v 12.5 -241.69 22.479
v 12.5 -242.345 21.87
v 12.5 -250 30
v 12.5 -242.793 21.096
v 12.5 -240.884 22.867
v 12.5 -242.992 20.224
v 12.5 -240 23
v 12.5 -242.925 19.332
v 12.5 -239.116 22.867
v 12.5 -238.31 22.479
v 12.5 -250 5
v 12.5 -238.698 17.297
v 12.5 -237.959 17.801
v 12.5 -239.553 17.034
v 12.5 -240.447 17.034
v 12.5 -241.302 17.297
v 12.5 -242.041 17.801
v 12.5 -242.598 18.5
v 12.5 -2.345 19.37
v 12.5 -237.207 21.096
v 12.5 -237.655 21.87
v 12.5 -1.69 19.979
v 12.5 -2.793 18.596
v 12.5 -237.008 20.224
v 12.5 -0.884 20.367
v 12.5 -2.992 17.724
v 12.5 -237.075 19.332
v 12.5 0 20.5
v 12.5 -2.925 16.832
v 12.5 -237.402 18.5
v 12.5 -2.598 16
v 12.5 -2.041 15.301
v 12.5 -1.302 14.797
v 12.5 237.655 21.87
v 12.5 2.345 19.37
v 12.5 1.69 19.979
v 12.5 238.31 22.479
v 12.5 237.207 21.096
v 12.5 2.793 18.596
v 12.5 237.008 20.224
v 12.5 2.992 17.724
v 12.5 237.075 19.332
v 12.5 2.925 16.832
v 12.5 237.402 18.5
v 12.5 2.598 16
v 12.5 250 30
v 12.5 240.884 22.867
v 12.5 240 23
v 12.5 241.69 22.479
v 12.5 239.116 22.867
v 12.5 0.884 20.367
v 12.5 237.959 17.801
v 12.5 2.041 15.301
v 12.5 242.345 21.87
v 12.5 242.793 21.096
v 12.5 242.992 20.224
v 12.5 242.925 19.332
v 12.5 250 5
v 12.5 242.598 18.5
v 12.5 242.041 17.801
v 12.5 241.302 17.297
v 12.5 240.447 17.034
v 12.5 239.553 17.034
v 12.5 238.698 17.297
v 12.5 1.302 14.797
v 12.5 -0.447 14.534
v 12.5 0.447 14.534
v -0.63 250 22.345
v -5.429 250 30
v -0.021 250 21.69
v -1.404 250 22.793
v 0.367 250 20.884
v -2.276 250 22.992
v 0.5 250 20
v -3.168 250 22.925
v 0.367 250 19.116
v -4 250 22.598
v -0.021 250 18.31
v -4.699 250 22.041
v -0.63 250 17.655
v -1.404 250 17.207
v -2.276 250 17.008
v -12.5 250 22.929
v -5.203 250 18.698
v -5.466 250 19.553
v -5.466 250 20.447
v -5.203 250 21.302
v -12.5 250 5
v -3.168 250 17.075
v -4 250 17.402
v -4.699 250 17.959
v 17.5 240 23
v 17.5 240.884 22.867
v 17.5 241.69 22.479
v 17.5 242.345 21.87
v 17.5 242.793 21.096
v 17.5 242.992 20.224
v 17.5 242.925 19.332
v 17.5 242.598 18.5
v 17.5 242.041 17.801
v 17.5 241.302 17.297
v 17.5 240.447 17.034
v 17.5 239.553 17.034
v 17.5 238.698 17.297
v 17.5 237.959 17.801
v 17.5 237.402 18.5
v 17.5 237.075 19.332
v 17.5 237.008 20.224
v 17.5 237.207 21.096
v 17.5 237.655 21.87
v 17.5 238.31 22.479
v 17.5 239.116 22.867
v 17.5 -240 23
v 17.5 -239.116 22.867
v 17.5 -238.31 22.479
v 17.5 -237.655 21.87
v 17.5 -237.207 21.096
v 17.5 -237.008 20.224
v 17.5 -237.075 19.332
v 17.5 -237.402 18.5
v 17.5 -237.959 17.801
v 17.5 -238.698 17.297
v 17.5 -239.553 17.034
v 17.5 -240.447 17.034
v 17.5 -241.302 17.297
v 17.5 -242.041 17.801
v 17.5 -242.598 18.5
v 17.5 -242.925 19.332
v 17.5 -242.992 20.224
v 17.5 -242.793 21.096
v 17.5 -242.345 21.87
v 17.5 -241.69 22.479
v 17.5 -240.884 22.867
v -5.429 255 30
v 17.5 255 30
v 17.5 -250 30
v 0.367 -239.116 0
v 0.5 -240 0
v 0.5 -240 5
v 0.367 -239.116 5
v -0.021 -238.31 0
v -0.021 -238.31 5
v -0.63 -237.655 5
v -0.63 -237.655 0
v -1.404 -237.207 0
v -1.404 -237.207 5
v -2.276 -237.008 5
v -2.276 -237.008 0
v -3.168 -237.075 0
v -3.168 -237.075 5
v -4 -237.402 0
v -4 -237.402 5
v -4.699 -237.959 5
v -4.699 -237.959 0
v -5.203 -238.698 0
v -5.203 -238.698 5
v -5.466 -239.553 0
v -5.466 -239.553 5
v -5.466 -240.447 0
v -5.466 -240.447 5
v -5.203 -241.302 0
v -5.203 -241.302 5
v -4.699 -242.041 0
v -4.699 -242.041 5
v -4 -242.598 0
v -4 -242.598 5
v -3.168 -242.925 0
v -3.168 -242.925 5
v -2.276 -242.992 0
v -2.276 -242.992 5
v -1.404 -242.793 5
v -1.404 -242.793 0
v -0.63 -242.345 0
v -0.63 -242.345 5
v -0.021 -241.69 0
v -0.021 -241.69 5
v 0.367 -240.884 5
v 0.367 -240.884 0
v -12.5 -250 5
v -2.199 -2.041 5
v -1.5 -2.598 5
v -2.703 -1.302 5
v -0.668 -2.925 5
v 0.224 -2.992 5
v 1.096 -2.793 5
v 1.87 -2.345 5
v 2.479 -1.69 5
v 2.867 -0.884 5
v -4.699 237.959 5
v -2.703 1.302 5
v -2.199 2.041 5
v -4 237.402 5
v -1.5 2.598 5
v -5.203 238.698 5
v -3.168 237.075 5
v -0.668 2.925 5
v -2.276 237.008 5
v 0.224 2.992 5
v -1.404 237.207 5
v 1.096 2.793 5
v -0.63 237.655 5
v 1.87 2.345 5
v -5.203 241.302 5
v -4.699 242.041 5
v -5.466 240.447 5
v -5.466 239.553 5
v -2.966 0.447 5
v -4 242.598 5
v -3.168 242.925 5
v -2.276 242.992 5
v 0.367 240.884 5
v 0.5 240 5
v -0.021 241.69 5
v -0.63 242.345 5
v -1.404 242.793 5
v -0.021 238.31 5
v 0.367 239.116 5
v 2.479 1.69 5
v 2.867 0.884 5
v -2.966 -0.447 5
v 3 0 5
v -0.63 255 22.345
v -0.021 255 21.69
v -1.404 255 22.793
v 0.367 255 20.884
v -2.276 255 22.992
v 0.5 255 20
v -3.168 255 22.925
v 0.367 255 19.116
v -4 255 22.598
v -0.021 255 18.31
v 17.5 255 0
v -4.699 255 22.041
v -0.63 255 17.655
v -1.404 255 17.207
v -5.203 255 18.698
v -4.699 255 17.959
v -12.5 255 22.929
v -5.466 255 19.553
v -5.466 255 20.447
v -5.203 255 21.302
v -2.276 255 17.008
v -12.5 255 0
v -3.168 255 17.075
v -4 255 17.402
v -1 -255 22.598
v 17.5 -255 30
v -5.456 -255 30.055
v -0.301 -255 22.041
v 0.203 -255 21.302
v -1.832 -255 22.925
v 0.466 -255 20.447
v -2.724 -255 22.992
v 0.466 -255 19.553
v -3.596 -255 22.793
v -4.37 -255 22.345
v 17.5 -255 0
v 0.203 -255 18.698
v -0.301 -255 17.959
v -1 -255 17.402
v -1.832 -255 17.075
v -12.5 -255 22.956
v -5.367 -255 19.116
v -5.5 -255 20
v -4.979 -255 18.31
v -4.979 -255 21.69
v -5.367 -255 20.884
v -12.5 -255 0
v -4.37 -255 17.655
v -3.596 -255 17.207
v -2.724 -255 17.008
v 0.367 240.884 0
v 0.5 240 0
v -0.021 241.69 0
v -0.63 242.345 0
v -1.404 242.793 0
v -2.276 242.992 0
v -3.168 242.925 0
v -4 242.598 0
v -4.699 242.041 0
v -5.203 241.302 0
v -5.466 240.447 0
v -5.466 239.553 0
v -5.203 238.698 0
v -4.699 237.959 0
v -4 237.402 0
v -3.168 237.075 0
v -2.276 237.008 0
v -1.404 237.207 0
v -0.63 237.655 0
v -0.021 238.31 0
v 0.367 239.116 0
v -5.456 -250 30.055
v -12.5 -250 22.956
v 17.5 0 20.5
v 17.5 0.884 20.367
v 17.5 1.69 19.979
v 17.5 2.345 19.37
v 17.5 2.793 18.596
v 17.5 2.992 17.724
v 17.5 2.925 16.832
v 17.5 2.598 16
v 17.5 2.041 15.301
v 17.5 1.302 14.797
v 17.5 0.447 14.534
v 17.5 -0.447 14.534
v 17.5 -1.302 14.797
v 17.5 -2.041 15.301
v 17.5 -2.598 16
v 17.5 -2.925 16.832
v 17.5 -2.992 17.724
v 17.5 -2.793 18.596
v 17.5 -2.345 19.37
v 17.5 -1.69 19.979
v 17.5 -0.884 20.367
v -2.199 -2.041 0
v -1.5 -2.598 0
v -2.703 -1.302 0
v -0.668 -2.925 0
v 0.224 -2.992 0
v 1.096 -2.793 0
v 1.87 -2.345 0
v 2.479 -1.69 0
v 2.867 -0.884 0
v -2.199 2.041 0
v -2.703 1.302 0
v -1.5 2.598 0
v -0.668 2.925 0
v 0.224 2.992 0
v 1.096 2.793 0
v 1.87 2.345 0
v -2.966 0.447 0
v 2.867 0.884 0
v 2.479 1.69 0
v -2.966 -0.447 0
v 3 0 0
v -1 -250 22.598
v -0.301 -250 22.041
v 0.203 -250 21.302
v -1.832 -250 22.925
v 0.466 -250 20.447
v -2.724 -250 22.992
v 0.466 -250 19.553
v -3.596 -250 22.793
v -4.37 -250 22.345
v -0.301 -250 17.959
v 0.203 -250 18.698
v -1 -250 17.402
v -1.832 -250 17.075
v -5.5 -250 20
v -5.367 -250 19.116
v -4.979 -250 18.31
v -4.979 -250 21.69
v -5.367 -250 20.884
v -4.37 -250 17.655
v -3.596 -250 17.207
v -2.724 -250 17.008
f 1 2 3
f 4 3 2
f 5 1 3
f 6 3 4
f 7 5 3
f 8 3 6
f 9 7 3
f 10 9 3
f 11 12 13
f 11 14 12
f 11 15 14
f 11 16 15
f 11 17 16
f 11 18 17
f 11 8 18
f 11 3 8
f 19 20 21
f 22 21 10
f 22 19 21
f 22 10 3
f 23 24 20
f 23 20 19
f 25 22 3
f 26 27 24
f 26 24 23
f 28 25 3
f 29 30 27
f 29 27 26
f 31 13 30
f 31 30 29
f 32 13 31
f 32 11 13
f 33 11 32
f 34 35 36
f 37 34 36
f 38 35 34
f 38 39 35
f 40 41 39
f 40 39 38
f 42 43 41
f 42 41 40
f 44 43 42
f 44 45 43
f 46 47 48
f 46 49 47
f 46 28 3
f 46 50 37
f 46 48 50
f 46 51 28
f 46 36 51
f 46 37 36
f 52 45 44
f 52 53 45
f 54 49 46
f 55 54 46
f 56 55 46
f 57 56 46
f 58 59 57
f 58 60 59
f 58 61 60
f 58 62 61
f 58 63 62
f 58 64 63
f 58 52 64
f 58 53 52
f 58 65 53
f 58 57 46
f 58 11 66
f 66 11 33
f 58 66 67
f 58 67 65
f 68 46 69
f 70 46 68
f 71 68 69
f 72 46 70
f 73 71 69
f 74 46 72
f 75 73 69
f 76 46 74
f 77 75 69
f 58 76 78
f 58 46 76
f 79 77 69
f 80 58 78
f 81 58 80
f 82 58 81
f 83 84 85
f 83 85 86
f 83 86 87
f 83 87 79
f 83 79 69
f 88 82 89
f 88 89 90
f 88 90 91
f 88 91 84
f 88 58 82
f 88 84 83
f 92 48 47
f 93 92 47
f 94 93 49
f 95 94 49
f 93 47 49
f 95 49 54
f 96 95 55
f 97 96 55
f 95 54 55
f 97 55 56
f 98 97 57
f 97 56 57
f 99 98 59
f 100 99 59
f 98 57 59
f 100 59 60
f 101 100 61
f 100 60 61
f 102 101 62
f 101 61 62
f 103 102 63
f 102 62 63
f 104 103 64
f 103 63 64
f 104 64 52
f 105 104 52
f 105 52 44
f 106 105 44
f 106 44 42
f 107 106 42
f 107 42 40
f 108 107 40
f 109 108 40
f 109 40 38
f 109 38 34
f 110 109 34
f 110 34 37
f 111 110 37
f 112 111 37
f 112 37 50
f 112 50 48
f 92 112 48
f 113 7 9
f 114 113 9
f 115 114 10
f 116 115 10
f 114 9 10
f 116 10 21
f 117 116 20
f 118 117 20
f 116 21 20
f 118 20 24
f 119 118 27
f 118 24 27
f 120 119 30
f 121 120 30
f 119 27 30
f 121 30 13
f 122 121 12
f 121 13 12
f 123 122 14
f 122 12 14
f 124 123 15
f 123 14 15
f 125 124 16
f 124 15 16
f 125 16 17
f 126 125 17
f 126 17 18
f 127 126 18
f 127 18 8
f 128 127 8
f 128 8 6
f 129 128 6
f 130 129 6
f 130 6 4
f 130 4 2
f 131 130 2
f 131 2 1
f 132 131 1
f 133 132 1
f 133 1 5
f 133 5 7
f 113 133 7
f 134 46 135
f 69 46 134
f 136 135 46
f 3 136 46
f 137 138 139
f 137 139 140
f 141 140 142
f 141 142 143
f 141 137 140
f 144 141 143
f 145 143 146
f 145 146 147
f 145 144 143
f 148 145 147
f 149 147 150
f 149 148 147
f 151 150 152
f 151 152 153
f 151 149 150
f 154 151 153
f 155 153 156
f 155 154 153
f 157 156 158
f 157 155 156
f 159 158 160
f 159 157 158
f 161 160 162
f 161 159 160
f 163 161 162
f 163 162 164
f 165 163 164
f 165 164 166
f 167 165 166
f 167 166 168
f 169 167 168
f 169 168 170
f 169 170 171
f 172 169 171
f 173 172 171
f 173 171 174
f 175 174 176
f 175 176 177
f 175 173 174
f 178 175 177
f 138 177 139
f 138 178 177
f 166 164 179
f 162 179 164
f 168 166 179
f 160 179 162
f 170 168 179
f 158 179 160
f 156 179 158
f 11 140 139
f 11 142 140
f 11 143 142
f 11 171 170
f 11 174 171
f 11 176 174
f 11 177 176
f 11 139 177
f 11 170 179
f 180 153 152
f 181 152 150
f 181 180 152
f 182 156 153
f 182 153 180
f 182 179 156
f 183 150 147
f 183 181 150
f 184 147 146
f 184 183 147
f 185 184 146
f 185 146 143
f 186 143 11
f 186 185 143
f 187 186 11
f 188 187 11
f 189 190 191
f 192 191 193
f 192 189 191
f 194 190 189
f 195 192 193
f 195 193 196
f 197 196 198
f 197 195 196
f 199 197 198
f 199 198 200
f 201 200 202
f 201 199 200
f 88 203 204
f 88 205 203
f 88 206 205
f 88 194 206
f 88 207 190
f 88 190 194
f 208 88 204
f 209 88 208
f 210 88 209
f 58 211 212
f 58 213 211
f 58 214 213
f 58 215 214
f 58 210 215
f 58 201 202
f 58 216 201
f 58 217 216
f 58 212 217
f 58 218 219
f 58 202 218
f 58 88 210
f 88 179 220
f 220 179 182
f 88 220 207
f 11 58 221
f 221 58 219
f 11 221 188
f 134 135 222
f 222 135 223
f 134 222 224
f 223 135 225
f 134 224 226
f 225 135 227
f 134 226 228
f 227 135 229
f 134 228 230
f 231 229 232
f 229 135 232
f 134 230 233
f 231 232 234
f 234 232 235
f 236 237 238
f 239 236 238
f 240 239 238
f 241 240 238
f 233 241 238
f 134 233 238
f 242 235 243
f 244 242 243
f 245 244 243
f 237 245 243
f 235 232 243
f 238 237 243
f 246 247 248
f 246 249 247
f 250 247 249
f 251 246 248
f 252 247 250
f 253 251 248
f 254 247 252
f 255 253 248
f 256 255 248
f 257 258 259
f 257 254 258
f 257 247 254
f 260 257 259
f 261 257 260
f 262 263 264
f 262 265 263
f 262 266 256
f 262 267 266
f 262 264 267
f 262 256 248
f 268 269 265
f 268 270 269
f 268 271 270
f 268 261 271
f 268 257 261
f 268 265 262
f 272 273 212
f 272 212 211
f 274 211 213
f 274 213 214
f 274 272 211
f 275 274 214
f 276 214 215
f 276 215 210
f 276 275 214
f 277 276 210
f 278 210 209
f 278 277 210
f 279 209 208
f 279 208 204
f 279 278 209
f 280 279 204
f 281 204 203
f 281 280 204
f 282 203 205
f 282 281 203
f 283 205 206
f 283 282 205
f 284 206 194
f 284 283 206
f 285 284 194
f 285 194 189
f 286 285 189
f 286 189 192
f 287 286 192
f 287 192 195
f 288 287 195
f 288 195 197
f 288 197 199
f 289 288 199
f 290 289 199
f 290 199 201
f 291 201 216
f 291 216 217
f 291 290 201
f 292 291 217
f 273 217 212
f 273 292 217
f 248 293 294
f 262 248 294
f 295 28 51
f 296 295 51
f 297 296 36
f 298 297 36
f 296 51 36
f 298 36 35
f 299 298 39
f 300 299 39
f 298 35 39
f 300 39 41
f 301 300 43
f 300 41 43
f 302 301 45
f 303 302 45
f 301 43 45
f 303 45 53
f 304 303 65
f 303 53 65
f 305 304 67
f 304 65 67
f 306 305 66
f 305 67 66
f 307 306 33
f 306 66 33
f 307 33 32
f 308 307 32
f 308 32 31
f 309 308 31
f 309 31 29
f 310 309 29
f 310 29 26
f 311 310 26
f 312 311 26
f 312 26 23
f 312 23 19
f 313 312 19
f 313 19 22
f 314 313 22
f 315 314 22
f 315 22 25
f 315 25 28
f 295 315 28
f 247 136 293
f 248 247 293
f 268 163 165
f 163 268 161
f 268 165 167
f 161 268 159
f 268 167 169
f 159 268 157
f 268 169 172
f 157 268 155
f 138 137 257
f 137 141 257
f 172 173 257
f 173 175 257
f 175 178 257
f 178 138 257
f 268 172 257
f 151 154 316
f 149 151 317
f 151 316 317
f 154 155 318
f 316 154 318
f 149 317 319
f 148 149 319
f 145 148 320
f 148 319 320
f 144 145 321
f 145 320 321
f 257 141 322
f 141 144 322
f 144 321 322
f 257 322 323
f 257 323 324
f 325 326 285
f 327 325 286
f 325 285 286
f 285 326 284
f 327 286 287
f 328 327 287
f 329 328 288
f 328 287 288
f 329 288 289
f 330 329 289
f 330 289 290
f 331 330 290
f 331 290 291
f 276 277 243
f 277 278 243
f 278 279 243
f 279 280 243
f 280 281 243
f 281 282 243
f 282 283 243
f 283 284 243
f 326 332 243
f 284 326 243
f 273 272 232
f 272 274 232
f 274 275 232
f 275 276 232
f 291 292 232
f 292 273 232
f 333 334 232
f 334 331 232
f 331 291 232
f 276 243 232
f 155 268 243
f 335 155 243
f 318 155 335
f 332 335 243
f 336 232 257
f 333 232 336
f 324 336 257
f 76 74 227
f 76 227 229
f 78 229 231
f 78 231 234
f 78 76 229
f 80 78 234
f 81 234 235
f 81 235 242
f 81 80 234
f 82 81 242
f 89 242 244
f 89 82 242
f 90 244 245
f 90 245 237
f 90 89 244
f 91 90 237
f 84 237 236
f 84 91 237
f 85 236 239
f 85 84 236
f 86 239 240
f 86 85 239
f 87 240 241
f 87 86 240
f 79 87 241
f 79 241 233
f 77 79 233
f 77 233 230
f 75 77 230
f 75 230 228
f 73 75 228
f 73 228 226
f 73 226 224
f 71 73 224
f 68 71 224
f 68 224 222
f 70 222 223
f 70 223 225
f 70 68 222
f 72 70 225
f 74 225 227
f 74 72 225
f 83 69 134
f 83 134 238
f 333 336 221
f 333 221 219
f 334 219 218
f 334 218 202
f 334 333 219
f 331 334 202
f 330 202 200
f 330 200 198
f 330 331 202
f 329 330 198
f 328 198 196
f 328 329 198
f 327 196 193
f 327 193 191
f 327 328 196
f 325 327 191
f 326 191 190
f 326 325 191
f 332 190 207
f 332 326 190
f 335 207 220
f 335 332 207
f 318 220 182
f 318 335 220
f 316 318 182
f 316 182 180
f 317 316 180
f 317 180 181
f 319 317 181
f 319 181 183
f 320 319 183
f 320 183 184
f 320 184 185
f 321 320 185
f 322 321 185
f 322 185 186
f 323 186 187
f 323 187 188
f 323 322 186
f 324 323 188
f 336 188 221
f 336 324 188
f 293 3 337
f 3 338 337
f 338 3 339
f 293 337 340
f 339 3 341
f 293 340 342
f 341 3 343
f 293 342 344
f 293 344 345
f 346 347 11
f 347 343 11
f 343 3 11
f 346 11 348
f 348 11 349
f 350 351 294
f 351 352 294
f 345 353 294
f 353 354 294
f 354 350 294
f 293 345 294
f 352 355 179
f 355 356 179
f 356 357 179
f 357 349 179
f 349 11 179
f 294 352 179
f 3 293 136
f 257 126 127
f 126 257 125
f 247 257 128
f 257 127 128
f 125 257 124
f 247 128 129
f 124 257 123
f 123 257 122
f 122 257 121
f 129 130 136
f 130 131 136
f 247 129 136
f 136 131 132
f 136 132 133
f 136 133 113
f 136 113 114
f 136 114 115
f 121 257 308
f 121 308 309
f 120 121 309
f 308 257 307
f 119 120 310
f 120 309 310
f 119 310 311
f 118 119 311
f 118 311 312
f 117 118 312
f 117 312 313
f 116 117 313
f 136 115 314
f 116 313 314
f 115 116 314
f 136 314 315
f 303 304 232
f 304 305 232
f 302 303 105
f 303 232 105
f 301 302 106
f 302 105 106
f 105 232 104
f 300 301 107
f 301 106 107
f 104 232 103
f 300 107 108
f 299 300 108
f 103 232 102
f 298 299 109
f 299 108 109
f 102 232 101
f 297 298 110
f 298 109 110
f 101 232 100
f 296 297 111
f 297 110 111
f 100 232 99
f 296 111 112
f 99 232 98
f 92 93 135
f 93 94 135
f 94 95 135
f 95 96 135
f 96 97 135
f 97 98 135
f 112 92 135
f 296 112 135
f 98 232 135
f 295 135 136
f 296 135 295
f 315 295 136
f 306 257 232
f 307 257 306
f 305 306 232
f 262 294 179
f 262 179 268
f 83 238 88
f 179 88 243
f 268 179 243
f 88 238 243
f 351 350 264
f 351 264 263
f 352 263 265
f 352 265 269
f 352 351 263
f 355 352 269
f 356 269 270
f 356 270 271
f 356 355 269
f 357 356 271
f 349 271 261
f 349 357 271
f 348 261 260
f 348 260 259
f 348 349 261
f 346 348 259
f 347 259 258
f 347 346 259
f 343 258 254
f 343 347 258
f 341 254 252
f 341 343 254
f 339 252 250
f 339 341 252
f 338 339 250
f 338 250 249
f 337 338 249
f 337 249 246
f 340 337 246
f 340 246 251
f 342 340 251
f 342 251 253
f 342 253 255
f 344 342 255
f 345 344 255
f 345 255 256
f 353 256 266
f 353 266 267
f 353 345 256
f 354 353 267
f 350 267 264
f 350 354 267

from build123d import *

# Parameters (mm, degrees)
SKETCH1_W           = 25
SKETCH1_H           = 500
SKETCH1_R           = 3
BOSS_EXTRUDE1_DEPTH = 5
SKETCH2_W           = 5
SKETCH2_H           = 500
BOSS_EXTRUDE2_DEPTH = 30
SKETCH3_R           = 3
CUT_EXTRUDE1_DEPTH  = 20.5
SKETCH4_R           = 3
BOSS_EXTRUDE3_DEPTH = 5
SKETCH5_R           = 3
BOSS_EXTRUDE4_DEPTH = 5


with BuildPart() as part:
    # Sketch1 → Boss-Extrude1 (new body)
    with BuildSketch(Plane.XY):
        Rectangle(SKETCH1_W, SKETCH1_H)
        with Locations((-2.5, 240)):
            Circle(SKETCH1_R, mode=Mode.SUBTRACT)
        with Locations((-2.5, -240)):
            Circle(SKETCH1_R, mode=Mode.SUBTRACT)
        Circle(SKETCH1_R, mode=Mode.SUBTRACT)
    extrude(amount=BOSS_EXTRUDE1_DEPTH)

    # Sketch2 → Boss-Extrude2 (add)
    with BuildSketch(Plane(origin=(0, 0, 0), x_dir=(-1, 0, 0), z_dir=(0, 0, -1))):
        with Locations((-15, 0)):
            Rectangle(SKETCH2_W, SKETCH2_H)
    extrude(amount=-BOSS_EXTRUDE2_DEPTH)

    # Sketch3 → Cut-Extrude1 (cut)
    with BuildSketch(Plane.ZY.offset(-12.5)):
        with Locations((20, -240)):
            Circle(SKETCH3_R)
        with Locations((17.5, 0)):
            Circle(SKETCH3_R)
        with Locations((20, 240)):
            Circle(SKETCH3_R)
    extrude(amount=-CUT_EXTRUDE1_DEPTH, mode=Mode.SUBTRACT)

    # Sketch4 → Boss-Extrude3 (add)
    with BuildSketch(Plane(origin=(0, 250, 0), x_dir=(1, 0, 0), z_dir=(0, 1, 0))):
        Polygon((-12.5, 0), (17.5, 0), (17.5, -30), (-5.428932188, -30), (-12.5, -22.928932188), align=None)
        with Locations((-2.5, -20)):
            Circle(SKETCH4_R, mode=Mode.SUBTRACT)
    extrude(amount=BOSS_EXTRUDE3_DEPTH)

    # Sketch5 → Boss-Extrude4 (add)
    with BuildSketch(Plane(origin=(0, -250, 0), x_dir=(-1, 0, 0), z_dir=(0, -1, 0))):
        Polygon((12.5, 0), (-17.5, 0), (-17.5, -30), (5.456313249, -30.054721724), (12.5, -22.95637847), align=None)
        with Locations((2.5, -20)):
            Circle(SKETCH5_R, mode=Mode.SUBTRACT)
    extrude(amount=BOSS_EXTRUDE4_DEPTH)


solid = part.part
